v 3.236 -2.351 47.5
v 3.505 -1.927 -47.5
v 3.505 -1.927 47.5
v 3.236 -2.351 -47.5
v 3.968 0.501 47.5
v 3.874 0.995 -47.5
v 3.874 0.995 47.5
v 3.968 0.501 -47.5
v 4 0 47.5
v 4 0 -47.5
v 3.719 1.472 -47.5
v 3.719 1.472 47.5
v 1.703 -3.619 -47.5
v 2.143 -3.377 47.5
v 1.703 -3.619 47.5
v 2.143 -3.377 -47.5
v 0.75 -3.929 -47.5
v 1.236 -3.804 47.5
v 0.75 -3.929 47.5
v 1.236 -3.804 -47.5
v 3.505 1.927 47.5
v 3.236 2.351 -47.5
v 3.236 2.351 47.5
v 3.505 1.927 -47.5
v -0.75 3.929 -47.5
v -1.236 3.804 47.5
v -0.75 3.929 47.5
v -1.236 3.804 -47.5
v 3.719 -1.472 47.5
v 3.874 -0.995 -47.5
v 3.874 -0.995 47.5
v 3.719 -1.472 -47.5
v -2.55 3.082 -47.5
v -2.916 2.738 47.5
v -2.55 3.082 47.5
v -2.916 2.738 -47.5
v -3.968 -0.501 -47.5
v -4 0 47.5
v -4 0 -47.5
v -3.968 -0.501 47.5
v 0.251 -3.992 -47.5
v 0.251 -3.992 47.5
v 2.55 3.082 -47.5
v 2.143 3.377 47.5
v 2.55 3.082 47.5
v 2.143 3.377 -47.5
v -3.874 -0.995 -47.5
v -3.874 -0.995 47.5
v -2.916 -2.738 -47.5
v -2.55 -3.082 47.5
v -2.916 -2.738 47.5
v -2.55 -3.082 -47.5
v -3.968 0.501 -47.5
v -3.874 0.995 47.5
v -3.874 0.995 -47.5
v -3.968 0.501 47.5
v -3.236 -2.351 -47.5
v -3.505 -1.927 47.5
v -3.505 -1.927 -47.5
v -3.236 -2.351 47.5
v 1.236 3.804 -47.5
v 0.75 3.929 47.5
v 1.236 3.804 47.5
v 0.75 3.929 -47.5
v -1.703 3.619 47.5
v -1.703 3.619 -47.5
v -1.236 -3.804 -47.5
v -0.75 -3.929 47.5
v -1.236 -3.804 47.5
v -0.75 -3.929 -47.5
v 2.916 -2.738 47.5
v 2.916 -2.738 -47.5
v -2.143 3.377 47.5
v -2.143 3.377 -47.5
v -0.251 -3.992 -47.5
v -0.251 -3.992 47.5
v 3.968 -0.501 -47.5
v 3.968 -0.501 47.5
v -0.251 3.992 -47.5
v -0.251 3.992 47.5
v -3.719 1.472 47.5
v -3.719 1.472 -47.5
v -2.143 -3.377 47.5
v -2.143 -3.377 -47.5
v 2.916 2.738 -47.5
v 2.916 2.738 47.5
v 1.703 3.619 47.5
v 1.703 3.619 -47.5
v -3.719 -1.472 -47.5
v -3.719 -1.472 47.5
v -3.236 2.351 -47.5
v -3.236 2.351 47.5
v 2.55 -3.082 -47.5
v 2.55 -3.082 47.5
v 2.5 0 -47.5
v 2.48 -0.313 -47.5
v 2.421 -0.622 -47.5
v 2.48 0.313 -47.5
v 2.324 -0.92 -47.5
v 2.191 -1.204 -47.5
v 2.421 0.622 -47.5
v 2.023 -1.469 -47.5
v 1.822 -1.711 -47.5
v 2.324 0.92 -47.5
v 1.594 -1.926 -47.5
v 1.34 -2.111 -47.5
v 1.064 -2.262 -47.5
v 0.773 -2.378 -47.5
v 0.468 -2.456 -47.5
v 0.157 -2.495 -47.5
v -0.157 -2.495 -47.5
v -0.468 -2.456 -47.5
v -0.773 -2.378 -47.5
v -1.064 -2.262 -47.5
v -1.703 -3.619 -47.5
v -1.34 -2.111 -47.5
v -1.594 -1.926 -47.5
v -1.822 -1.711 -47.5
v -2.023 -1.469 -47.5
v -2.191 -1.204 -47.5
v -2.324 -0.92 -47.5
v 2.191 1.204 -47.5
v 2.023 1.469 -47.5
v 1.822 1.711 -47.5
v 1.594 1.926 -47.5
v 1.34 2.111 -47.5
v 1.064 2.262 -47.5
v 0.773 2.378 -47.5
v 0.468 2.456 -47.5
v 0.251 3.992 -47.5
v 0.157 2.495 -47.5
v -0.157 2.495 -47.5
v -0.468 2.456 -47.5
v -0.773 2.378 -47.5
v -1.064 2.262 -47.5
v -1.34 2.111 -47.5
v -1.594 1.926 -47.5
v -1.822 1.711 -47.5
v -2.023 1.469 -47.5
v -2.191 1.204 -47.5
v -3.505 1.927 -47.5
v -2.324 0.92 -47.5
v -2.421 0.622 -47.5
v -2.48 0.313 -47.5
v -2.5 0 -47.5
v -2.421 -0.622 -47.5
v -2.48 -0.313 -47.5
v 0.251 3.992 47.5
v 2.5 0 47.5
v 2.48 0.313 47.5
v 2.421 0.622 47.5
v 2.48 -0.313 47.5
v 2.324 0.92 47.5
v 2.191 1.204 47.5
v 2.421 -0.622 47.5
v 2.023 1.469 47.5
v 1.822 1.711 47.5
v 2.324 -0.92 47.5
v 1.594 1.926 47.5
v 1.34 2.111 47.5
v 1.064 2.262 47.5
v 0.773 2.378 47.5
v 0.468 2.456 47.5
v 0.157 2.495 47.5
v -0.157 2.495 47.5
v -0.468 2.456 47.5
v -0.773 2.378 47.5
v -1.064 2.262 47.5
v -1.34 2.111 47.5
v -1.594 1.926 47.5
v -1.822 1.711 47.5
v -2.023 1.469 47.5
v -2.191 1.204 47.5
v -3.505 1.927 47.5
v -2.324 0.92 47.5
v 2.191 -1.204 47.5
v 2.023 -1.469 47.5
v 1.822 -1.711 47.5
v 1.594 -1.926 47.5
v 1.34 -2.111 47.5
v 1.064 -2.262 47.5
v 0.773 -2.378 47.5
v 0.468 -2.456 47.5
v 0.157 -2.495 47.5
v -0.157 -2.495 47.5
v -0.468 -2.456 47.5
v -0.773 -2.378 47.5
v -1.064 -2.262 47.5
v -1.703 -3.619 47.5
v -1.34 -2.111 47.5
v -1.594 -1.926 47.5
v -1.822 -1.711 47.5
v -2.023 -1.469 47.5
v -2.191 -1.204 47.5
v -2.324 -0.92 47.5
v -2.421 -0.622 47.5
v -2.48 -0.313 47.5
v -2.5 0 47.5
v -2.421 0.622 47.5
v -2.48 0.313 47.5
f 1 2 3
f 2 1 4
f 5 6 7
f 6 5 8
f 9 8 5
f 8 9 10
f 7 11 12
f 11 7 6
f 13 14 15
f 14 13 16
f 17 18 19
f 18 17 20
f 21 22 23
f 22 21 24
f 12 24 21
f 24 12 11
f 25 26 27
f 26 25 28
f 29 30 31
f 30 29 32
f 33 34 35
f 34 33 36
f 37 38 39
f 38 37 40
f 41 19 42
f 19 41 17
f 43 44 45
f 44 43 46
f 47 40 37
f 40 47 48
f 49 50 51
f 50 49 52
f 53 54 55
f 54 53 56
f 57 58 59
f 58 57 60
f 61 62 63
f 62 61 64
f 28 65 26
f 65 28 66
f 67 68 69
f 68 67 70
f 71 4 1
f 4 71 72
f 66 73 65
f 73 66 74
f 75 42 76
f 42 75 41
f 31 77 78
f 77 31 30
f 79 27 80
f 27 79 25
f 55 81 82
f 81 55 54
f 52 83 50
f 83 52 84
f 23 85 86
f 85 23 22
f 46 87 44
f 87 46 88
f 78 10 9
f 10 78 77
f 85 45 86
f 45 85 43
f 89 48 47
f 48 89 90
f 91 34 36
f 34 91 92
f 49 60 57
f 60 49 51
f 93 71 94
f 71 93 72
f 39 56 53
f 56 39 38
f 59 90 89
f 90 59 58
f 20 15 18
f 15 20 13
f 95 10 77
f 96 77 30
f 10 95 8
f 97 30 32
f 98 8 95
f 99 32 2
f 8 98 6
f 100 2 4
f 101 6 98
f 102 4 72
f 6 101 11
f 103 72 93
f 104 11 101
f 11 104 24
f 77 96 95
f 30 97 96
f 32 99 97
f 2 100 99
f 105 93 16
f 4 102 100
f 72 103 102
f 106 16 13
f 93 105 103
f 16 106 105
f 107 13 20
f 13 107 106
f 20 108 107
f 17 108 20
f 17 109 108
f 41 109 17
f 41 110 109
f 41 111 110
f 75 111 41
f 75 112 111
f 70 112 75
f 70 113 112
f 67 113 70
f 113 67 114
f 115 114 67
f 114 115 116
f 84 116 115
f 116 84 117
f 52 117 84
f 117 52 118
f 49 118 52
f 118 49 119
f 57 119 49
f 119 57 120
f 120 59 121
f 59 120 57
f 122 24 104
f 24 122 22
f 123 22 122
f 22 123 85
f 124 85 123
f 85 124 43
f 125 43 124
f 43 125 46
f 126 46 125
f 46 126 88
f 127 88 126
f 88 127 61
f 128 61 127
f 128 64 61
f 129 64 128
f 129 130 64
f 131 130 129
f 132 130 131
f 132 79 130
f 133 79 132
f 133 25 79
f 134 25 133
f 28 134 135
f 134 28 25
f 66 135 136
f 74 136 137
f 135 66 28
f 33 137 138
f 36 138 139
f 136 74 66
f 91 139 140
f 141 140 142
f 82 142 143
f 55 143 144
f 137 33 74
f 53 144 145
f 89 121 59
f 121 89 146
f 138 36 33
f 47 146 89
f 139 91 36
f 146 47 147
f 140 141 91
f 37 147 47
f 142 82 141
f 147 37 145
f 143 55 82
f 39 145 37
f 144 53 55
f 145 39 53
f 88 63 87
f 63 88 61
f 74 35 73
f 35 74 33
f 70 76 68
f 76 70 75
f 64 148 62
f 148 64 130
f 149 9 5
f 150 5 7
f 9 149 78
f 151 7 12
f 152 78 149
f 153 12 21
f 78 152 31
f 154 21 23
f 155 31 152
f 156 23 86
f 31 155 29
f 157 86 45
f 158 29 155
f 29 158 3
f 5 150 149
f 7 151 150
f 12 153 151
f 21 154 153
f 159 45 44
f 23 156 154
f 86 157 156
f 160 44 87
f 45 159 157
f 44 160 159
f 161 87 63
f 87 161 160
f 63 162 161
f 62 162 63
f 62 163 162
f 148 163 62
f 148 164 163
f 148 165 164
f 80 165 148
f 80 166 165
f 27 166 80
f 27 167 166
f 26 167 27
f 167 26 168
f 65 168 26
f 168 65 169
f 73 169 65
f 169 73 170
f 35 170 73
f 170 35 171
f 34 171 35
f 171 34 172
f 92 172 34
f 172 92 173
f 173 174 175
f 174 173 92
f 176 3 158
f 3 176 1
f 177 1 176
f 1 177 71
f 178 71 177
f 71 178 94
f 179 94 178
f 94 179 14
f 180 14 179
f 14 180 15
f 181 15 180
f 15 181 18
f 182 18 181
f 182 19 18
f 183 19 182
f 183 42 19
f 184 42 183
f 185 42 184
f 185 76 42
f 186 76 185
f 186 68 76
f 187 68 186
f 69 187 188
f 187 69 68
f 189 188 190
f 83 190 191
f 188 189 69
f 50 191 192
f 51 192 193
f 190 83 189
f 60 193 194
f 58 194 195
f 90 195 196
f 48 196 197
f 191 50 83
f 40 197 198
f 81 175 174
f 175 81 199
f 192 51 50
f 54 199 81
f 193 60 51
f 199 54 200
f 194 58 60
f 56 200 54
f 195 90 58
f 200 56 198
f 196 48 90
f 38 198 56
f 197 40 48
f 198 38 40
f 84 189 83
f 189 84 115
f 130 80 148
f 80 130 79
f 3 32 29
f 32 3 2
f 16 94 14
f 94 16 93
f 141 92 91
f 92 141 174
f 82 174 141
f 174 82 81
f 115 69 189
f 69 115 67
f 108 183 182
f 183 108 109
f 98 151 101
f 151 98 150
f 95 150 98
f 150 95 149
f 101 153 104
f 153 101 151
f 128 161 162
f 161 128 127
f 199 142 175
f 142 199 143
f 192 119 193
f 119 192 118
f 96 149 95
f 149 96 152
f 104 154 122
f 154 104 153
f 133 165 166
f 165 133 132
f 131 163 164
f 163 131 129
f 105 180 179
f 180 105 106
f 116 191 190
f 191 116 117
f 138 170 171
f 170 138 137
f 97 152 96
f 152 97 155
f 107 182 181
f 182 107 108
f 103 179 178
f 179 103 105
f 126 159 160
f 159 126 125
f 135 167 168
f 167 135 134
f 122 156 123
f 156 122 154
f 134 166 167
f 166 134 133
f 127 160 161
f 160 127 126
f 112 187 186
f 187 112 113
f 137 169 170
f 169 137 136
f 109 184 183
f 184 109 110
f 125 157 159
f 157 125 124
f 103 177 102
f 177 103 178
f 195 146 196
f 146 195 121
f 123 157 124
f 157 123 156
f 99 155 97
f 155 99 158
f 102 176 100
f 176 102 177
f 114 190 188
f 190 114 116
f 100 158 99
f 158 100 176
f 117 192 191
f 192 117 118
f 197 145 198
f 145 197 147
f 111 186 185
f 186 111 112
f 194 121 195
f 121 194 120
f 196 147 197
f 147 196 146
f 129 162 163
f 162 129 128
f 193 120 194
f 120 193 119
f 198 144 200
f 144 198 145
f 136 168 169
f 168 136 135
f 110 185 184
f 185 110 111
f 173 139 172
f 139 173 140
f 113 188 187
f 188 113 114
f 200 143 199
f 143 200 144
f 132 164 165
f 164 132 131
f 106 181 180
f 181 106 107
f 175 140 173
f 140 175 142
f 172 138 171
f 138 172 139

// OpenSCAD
$fn = 50;


difference() {
	union() {
		translate(v = [0, 0, -47.5000000000]) {
			cylinder(h = 95, r = 4.0000000000);
		}
	}
	union() {
		translate(v = [0, 0, -100.0000000000]) {
			cylinder(h = 200, r = 2.5000000000);
		}
	}
}
